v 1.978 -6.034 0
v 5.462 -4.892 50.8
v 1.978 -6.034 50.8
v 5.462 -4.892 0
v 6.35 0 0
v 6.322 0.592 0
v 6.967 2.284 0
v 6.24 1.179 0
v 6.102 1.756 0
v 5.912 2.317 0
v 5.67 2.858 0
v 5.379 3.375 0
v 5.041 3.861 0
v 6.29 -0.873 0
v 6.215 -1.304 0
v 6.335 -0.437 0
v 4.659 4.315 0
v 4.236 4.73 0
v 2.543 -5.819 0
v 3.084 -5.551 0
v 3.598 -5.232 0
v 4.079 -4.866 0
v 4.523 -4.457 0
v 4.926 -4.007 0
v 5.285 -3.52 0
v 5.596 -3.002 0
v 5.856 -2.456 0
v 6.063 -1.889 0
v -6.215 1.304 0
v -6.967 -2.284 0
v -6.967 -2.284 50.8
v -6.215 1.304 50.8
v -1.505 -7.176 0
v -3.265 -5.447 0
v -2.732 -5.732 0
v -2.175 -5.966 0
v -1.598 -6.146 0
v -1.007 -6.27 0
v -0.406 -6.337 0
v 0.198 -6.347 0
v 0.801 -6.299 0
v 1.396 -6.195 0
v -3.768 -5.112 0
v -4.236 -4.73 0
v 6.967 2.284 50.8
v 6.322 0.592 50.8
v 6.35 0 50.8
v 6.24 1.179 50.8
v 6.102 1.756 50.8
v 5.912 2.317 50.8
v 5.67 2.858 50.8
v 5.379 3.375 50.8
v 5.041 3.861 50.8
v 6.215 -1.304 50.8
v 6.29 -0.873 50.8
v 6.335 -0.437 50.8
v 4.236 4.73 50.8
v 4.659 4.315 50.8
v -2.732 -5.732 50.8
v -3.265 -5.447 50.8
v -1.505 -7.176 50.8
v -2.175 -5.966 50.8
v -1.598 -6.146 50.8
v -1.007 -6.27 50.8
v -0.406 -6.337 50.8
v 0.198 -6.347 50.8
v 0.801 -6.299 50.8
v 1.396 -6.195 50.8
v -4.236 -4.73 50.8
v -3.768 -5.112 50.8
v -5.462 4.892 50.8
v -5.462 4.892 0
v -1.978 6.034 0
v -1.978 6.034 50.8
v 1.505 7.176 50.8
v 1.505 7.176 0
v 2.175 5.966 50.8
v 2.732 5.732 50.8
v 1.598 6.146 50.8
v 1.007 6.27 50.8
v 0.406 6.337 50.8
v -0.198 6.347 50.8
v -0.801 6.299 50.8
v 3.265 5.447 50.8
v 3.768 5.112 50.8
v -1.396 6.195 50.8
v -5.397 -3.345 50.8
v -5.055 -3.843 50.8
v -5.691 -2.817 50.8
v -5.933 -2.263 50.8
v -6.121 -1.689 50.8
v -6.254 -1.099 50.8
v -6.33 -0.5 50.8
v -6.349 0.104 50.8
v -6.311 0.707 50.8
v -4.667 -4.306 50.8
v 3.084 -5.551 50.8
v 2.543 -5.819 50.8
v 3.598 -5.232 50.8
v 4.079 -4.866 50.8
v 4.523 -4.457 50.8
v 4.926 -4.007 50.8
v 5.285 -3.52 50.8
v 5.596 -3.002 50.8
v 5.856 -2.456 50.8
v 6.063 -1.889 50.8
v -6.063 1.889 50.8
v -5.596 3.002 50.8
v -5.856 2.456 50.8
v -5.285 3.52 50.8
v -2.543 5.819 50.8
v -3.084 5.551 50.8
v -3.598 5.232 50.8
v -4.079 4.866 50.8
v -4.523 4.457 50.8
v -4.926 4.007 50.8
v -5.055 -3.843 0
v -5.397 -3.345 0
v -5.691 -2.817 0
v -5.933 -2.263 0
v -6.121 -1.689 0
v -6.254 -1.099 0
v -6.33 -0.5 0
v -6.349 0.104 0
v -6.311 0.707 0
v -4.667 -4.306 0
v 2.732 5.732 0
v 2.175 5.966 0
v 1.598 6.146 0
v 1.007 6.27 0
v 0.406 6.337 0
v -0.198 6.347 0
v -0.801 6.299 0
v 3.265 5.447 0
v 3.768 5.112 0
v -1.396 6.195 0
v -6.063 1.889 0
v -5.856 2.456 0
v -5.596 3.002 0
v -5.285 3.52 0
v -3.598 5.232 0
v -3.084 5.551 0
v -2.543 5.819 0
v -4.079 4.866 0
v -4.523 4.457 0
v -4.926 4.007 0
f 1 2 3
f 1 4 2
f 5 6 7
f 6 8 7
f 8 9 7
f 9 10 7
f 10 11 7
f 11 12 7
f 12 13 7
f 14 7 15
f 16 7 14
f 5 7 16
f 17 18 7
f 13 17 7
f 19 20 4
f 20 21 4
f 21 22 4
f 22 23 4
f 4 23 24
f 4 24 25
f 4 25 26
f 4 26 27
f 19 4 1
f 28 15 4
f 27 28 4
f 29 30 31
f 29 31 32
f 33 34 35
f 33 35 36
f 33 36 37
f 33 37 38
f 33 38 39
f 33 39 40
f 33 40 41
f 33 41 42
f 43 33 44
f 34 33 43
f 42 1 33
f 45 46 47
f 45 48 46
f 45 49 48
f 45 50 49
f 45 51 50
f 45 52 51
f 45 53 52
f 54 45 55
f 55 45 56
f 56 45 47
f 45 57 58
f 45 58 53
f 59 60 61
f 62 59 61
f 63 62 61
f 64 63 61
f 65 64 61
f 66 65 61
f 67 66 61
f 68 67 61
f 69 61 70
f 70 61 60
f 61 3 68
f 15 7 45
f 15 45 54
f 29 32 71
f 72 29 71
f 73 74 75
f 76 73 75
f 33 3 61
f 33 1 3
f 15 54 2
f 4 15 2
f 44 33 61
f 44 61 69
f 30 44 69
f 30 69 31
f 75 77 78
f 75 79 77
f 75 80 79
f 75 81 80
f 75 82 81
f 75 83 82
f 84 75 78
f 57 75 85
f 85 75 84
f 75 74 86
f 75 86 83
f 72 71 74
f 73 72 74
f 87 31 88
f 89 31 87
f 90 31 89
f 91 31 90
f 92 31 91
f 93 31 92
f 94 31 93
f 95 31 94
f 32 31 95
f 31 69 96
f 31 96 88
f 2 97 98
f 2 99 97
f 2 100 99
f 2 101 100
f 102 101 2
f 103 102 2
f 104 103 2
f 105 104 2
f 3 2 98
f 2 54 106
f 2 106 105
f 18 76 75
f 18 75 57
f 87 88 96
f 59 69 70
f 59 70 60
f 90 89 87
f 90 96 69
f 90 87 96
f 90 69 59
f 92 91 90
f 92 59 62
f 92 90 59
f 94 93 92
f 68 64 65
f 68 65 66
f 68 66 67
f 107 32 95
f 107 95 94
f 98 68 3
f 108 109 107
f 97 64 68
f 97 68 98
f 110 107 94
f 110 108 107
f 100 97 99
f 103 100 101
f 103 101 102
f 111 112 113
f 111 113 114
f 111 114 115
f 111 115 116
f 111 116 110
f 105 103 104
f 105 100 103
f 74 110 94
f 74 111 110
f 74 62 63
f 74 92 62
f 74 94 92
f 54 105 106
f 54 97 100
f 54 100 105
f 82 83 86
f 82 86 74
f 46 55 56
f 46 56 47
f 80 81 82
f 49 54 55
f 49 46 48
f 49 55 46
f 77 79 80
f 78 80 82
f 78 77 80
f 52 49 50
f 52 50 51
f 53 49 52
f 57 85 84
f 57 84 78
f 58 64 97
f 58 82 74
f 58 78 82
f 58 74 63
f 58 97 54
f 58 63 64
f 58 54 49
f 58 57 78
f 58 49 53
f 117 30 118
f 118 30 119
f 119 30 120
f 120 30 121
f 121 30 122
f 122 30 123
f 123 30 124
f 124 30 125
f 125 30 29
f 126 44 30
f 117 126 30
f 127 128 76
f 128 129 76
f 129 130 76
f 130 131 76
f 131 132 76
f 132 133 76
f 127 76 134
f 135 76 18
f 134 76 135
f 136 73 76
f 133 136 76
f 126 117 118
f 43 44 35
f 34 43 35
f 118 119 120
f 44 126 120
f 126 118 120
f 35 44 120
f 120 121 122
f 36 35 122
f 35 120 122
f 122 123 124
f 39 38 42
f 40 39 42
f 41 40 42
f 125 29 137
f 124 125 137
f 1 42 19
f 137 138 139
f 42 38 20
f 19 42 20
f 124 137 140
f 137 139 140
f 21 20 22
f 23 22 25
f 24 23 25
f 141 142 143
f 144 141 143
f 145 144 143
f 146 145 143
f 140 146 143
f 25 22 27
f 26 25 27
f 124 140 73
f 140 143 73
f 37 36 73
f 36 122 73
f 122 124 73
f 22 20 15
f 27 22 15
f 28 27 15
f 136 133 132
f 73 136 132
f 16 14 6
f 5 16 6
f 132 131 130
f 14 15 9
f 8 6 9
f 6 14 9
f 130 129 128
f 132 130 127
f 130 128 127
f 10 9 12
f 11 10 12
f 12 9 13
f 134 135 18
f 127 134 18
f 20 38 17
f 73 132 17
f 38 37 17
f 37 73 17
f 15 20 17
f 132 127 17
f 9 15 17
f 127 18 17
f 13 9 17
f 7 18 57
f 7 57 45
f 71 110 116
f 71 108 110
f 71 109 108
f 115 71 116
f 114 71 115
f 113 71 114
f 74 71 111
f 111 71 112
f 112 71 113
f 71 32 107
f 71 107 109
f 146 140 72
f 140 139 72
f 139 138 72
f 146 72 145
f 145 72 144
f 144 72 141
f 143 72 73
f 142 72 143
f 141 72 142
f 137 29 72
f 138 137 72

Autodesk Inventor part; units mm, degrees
ref_plane "YZ Plane" through (0, 0, 0) normal (1, 0, 0) x (0, 1, 0)
ref_plane "XZ Plane" through (0, 0, 0) normal (0, 1, 0) x (-1, 0, 0)
ref_plane "XY Plane" through (0, 0, 0) normal (0, 0, 1) x (1, 0, 0)
sketch "Sketch1" plane through (0, 0, 0) normal (0, 0, 1) x (1, 0, 0)
  circle A0 centre (0, 0) radius 6.35
  line L0 (6.9674, 2.2843) -> (5.462, -4.8918)
  line L1 (5.462, -4.8918) -> (-1.5054, -7.1761)
  line L2 (-1.5054, -7.1761) -> (-6.9674, -2.2843)
  line L3 (-6.9674, -2.2843) -> (-5.462, 4.8918)
  line L4 (-5.462, 4.8918) -> (1.5054, 7.1761)
  line L5 (1.5054, 7.1761) -> (6.9674, 2.2843)
  point P0 (4.2364, 4.7302)
  dimension "d0" = 12.7
extrude "Extrusion1" add sketch "Sketch1" along normal blind 50.8
properties part number "4-bar intake (2) shaft"
